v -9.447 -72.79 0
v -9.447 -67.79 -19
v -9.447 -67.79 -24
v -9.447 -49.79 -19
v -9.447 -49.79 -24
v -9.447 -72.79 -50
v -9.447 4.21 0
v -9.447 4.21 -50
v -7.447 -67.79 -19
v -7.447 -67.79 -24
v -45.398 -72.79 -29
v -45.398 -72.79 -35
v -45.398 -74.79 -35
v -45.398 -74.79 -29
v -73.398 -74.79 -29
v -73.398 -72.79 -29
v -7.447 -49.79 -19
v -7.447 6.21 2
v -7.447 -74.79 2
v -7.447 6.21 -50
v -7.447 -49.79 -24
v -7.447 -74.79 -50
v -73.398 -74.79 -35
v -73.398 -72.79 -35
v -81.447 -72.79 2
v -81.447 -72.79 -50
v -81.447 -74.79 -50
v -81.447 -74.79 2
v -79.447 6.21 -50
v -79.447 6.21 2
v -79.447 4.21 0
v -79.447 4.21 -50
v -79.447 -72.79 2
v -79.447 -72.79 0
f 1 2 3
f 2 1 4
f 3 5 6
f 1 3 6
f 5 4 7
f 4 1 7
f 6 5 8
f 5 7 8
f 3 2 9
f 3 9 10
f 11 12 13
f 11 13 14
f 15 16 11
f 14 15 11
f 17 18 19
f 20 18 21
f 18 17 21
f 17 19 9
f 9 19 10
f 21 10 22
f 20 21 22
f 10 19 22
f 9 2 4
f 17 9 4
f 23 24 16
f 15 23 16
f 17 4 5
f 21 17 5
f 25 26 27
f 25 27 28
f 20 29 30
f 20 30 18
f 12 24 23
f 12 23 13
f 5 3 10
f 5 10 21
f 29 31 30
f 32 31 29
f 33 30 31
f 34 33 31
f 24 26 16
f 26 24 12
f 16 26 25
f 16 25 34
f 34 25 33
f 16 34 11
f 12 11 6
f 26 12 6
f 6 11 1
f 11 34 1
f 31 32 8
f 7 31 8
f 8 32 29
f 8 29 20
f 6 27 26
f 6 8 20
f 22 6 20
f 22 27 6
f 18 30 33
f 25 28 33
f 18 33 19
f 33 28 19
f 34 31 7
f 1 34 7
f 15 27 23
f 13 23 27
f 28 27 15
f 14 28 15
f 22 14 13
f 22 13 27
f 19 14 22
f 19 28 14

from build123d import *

# Parameters (mm, degrees)
SKIZZE1_W                       = 70
SKIZZE1_H                       = 77
AUFSATZ_LINEAR_AUSTRAGEN1_DEPTH = 2
SKIZZE2_W                       = 52
SKIZZE2_H                       = 77
SKIZZE2_W_2                     = 5
SKIZZE2_H_2                     = 18
AUFSATZ_LINEAR_AUSTRAGEN2_DEPTH = 2
SKIZZE3_W                       = 74
SKIZZE3_H                       = 52
SKIZZE3_W_2                     = 28
SKIZZE3_H_2                     = 6
AUFSATZ_LINEAR_AUSTRAGEN3_DEPTH = 2
SKIZZE9_W                       = 72
SKIZZE9_H                       = 52
AUFSATZ_LINEAR_AUSTRAGEN7_DEPTH = 2


with BuildPart() as part:
    # Skizze1 → Aufsatz-Linear austragen1 (new body)
    with BuildSketch(Plane.XY):
        with Locations((-44.446663724, -34.290378007)):
            Rectangle(SKIZZE1_W, SKIZZE1_H)
    extrude(amount=AUFSATZ_LINEAR_AUSTRAGEN1_DEPTH)

    # Skizze2 → Aufsatz-Linear austragen2 (add)
    with BuildSketch(Plane(origin=(-9.446663724, 0, 0), x_dir=(0, 0, -1), z_dir=(1, 0, 0))):
        with Locations((24, -34.290378007)):
            Rectangle(SKIZZE2_W, SKIZZE2_H)
        with Locations((21.5, -58.790378007)):
            Rectangle(SKIZZE2_W_2, SKIZZE2_H_2, mode=Mode.SUBTRACT)
    extrude(amount=AUFSATZ_LINEAR_AUSTRAGEN2_DEPTH)

    # Skizze3 → Aufsatz-Linear austragen3 (add)
    with BuildSketch(Plane.XZ.offset(72.790378007)):
        with Locations((-44.446663724, -24)):
            Rectangle(SKIZZE3_W, SKIZZE3_H)
        with Locations((-59.397812879, -32)):
            Rectangle(SKIZZE3_W_2, SKIZZE3_H_2, mode=Mode.SUBTRACT)
    extrude(amount=AUFSATZ_LINEAR_AUSTRAGEN3_DEPTH)

    # Skizze9 → Aufsatz-Linear austragen7 (add)
    with BuildSketch(Plane(origin=(0, 4.209621993, 0), x_dir=(1, 0, 0), z_dir=(0, 1, 0))):
        with Locations((-43.446663724, 24)):
            Rectangle(SKIZZE9_W, SKIZZE9_H)
    extrude(amount=AUFSATZ_LINEAR_AUSTRAGEN7_DEPTH)


solid = part.part
